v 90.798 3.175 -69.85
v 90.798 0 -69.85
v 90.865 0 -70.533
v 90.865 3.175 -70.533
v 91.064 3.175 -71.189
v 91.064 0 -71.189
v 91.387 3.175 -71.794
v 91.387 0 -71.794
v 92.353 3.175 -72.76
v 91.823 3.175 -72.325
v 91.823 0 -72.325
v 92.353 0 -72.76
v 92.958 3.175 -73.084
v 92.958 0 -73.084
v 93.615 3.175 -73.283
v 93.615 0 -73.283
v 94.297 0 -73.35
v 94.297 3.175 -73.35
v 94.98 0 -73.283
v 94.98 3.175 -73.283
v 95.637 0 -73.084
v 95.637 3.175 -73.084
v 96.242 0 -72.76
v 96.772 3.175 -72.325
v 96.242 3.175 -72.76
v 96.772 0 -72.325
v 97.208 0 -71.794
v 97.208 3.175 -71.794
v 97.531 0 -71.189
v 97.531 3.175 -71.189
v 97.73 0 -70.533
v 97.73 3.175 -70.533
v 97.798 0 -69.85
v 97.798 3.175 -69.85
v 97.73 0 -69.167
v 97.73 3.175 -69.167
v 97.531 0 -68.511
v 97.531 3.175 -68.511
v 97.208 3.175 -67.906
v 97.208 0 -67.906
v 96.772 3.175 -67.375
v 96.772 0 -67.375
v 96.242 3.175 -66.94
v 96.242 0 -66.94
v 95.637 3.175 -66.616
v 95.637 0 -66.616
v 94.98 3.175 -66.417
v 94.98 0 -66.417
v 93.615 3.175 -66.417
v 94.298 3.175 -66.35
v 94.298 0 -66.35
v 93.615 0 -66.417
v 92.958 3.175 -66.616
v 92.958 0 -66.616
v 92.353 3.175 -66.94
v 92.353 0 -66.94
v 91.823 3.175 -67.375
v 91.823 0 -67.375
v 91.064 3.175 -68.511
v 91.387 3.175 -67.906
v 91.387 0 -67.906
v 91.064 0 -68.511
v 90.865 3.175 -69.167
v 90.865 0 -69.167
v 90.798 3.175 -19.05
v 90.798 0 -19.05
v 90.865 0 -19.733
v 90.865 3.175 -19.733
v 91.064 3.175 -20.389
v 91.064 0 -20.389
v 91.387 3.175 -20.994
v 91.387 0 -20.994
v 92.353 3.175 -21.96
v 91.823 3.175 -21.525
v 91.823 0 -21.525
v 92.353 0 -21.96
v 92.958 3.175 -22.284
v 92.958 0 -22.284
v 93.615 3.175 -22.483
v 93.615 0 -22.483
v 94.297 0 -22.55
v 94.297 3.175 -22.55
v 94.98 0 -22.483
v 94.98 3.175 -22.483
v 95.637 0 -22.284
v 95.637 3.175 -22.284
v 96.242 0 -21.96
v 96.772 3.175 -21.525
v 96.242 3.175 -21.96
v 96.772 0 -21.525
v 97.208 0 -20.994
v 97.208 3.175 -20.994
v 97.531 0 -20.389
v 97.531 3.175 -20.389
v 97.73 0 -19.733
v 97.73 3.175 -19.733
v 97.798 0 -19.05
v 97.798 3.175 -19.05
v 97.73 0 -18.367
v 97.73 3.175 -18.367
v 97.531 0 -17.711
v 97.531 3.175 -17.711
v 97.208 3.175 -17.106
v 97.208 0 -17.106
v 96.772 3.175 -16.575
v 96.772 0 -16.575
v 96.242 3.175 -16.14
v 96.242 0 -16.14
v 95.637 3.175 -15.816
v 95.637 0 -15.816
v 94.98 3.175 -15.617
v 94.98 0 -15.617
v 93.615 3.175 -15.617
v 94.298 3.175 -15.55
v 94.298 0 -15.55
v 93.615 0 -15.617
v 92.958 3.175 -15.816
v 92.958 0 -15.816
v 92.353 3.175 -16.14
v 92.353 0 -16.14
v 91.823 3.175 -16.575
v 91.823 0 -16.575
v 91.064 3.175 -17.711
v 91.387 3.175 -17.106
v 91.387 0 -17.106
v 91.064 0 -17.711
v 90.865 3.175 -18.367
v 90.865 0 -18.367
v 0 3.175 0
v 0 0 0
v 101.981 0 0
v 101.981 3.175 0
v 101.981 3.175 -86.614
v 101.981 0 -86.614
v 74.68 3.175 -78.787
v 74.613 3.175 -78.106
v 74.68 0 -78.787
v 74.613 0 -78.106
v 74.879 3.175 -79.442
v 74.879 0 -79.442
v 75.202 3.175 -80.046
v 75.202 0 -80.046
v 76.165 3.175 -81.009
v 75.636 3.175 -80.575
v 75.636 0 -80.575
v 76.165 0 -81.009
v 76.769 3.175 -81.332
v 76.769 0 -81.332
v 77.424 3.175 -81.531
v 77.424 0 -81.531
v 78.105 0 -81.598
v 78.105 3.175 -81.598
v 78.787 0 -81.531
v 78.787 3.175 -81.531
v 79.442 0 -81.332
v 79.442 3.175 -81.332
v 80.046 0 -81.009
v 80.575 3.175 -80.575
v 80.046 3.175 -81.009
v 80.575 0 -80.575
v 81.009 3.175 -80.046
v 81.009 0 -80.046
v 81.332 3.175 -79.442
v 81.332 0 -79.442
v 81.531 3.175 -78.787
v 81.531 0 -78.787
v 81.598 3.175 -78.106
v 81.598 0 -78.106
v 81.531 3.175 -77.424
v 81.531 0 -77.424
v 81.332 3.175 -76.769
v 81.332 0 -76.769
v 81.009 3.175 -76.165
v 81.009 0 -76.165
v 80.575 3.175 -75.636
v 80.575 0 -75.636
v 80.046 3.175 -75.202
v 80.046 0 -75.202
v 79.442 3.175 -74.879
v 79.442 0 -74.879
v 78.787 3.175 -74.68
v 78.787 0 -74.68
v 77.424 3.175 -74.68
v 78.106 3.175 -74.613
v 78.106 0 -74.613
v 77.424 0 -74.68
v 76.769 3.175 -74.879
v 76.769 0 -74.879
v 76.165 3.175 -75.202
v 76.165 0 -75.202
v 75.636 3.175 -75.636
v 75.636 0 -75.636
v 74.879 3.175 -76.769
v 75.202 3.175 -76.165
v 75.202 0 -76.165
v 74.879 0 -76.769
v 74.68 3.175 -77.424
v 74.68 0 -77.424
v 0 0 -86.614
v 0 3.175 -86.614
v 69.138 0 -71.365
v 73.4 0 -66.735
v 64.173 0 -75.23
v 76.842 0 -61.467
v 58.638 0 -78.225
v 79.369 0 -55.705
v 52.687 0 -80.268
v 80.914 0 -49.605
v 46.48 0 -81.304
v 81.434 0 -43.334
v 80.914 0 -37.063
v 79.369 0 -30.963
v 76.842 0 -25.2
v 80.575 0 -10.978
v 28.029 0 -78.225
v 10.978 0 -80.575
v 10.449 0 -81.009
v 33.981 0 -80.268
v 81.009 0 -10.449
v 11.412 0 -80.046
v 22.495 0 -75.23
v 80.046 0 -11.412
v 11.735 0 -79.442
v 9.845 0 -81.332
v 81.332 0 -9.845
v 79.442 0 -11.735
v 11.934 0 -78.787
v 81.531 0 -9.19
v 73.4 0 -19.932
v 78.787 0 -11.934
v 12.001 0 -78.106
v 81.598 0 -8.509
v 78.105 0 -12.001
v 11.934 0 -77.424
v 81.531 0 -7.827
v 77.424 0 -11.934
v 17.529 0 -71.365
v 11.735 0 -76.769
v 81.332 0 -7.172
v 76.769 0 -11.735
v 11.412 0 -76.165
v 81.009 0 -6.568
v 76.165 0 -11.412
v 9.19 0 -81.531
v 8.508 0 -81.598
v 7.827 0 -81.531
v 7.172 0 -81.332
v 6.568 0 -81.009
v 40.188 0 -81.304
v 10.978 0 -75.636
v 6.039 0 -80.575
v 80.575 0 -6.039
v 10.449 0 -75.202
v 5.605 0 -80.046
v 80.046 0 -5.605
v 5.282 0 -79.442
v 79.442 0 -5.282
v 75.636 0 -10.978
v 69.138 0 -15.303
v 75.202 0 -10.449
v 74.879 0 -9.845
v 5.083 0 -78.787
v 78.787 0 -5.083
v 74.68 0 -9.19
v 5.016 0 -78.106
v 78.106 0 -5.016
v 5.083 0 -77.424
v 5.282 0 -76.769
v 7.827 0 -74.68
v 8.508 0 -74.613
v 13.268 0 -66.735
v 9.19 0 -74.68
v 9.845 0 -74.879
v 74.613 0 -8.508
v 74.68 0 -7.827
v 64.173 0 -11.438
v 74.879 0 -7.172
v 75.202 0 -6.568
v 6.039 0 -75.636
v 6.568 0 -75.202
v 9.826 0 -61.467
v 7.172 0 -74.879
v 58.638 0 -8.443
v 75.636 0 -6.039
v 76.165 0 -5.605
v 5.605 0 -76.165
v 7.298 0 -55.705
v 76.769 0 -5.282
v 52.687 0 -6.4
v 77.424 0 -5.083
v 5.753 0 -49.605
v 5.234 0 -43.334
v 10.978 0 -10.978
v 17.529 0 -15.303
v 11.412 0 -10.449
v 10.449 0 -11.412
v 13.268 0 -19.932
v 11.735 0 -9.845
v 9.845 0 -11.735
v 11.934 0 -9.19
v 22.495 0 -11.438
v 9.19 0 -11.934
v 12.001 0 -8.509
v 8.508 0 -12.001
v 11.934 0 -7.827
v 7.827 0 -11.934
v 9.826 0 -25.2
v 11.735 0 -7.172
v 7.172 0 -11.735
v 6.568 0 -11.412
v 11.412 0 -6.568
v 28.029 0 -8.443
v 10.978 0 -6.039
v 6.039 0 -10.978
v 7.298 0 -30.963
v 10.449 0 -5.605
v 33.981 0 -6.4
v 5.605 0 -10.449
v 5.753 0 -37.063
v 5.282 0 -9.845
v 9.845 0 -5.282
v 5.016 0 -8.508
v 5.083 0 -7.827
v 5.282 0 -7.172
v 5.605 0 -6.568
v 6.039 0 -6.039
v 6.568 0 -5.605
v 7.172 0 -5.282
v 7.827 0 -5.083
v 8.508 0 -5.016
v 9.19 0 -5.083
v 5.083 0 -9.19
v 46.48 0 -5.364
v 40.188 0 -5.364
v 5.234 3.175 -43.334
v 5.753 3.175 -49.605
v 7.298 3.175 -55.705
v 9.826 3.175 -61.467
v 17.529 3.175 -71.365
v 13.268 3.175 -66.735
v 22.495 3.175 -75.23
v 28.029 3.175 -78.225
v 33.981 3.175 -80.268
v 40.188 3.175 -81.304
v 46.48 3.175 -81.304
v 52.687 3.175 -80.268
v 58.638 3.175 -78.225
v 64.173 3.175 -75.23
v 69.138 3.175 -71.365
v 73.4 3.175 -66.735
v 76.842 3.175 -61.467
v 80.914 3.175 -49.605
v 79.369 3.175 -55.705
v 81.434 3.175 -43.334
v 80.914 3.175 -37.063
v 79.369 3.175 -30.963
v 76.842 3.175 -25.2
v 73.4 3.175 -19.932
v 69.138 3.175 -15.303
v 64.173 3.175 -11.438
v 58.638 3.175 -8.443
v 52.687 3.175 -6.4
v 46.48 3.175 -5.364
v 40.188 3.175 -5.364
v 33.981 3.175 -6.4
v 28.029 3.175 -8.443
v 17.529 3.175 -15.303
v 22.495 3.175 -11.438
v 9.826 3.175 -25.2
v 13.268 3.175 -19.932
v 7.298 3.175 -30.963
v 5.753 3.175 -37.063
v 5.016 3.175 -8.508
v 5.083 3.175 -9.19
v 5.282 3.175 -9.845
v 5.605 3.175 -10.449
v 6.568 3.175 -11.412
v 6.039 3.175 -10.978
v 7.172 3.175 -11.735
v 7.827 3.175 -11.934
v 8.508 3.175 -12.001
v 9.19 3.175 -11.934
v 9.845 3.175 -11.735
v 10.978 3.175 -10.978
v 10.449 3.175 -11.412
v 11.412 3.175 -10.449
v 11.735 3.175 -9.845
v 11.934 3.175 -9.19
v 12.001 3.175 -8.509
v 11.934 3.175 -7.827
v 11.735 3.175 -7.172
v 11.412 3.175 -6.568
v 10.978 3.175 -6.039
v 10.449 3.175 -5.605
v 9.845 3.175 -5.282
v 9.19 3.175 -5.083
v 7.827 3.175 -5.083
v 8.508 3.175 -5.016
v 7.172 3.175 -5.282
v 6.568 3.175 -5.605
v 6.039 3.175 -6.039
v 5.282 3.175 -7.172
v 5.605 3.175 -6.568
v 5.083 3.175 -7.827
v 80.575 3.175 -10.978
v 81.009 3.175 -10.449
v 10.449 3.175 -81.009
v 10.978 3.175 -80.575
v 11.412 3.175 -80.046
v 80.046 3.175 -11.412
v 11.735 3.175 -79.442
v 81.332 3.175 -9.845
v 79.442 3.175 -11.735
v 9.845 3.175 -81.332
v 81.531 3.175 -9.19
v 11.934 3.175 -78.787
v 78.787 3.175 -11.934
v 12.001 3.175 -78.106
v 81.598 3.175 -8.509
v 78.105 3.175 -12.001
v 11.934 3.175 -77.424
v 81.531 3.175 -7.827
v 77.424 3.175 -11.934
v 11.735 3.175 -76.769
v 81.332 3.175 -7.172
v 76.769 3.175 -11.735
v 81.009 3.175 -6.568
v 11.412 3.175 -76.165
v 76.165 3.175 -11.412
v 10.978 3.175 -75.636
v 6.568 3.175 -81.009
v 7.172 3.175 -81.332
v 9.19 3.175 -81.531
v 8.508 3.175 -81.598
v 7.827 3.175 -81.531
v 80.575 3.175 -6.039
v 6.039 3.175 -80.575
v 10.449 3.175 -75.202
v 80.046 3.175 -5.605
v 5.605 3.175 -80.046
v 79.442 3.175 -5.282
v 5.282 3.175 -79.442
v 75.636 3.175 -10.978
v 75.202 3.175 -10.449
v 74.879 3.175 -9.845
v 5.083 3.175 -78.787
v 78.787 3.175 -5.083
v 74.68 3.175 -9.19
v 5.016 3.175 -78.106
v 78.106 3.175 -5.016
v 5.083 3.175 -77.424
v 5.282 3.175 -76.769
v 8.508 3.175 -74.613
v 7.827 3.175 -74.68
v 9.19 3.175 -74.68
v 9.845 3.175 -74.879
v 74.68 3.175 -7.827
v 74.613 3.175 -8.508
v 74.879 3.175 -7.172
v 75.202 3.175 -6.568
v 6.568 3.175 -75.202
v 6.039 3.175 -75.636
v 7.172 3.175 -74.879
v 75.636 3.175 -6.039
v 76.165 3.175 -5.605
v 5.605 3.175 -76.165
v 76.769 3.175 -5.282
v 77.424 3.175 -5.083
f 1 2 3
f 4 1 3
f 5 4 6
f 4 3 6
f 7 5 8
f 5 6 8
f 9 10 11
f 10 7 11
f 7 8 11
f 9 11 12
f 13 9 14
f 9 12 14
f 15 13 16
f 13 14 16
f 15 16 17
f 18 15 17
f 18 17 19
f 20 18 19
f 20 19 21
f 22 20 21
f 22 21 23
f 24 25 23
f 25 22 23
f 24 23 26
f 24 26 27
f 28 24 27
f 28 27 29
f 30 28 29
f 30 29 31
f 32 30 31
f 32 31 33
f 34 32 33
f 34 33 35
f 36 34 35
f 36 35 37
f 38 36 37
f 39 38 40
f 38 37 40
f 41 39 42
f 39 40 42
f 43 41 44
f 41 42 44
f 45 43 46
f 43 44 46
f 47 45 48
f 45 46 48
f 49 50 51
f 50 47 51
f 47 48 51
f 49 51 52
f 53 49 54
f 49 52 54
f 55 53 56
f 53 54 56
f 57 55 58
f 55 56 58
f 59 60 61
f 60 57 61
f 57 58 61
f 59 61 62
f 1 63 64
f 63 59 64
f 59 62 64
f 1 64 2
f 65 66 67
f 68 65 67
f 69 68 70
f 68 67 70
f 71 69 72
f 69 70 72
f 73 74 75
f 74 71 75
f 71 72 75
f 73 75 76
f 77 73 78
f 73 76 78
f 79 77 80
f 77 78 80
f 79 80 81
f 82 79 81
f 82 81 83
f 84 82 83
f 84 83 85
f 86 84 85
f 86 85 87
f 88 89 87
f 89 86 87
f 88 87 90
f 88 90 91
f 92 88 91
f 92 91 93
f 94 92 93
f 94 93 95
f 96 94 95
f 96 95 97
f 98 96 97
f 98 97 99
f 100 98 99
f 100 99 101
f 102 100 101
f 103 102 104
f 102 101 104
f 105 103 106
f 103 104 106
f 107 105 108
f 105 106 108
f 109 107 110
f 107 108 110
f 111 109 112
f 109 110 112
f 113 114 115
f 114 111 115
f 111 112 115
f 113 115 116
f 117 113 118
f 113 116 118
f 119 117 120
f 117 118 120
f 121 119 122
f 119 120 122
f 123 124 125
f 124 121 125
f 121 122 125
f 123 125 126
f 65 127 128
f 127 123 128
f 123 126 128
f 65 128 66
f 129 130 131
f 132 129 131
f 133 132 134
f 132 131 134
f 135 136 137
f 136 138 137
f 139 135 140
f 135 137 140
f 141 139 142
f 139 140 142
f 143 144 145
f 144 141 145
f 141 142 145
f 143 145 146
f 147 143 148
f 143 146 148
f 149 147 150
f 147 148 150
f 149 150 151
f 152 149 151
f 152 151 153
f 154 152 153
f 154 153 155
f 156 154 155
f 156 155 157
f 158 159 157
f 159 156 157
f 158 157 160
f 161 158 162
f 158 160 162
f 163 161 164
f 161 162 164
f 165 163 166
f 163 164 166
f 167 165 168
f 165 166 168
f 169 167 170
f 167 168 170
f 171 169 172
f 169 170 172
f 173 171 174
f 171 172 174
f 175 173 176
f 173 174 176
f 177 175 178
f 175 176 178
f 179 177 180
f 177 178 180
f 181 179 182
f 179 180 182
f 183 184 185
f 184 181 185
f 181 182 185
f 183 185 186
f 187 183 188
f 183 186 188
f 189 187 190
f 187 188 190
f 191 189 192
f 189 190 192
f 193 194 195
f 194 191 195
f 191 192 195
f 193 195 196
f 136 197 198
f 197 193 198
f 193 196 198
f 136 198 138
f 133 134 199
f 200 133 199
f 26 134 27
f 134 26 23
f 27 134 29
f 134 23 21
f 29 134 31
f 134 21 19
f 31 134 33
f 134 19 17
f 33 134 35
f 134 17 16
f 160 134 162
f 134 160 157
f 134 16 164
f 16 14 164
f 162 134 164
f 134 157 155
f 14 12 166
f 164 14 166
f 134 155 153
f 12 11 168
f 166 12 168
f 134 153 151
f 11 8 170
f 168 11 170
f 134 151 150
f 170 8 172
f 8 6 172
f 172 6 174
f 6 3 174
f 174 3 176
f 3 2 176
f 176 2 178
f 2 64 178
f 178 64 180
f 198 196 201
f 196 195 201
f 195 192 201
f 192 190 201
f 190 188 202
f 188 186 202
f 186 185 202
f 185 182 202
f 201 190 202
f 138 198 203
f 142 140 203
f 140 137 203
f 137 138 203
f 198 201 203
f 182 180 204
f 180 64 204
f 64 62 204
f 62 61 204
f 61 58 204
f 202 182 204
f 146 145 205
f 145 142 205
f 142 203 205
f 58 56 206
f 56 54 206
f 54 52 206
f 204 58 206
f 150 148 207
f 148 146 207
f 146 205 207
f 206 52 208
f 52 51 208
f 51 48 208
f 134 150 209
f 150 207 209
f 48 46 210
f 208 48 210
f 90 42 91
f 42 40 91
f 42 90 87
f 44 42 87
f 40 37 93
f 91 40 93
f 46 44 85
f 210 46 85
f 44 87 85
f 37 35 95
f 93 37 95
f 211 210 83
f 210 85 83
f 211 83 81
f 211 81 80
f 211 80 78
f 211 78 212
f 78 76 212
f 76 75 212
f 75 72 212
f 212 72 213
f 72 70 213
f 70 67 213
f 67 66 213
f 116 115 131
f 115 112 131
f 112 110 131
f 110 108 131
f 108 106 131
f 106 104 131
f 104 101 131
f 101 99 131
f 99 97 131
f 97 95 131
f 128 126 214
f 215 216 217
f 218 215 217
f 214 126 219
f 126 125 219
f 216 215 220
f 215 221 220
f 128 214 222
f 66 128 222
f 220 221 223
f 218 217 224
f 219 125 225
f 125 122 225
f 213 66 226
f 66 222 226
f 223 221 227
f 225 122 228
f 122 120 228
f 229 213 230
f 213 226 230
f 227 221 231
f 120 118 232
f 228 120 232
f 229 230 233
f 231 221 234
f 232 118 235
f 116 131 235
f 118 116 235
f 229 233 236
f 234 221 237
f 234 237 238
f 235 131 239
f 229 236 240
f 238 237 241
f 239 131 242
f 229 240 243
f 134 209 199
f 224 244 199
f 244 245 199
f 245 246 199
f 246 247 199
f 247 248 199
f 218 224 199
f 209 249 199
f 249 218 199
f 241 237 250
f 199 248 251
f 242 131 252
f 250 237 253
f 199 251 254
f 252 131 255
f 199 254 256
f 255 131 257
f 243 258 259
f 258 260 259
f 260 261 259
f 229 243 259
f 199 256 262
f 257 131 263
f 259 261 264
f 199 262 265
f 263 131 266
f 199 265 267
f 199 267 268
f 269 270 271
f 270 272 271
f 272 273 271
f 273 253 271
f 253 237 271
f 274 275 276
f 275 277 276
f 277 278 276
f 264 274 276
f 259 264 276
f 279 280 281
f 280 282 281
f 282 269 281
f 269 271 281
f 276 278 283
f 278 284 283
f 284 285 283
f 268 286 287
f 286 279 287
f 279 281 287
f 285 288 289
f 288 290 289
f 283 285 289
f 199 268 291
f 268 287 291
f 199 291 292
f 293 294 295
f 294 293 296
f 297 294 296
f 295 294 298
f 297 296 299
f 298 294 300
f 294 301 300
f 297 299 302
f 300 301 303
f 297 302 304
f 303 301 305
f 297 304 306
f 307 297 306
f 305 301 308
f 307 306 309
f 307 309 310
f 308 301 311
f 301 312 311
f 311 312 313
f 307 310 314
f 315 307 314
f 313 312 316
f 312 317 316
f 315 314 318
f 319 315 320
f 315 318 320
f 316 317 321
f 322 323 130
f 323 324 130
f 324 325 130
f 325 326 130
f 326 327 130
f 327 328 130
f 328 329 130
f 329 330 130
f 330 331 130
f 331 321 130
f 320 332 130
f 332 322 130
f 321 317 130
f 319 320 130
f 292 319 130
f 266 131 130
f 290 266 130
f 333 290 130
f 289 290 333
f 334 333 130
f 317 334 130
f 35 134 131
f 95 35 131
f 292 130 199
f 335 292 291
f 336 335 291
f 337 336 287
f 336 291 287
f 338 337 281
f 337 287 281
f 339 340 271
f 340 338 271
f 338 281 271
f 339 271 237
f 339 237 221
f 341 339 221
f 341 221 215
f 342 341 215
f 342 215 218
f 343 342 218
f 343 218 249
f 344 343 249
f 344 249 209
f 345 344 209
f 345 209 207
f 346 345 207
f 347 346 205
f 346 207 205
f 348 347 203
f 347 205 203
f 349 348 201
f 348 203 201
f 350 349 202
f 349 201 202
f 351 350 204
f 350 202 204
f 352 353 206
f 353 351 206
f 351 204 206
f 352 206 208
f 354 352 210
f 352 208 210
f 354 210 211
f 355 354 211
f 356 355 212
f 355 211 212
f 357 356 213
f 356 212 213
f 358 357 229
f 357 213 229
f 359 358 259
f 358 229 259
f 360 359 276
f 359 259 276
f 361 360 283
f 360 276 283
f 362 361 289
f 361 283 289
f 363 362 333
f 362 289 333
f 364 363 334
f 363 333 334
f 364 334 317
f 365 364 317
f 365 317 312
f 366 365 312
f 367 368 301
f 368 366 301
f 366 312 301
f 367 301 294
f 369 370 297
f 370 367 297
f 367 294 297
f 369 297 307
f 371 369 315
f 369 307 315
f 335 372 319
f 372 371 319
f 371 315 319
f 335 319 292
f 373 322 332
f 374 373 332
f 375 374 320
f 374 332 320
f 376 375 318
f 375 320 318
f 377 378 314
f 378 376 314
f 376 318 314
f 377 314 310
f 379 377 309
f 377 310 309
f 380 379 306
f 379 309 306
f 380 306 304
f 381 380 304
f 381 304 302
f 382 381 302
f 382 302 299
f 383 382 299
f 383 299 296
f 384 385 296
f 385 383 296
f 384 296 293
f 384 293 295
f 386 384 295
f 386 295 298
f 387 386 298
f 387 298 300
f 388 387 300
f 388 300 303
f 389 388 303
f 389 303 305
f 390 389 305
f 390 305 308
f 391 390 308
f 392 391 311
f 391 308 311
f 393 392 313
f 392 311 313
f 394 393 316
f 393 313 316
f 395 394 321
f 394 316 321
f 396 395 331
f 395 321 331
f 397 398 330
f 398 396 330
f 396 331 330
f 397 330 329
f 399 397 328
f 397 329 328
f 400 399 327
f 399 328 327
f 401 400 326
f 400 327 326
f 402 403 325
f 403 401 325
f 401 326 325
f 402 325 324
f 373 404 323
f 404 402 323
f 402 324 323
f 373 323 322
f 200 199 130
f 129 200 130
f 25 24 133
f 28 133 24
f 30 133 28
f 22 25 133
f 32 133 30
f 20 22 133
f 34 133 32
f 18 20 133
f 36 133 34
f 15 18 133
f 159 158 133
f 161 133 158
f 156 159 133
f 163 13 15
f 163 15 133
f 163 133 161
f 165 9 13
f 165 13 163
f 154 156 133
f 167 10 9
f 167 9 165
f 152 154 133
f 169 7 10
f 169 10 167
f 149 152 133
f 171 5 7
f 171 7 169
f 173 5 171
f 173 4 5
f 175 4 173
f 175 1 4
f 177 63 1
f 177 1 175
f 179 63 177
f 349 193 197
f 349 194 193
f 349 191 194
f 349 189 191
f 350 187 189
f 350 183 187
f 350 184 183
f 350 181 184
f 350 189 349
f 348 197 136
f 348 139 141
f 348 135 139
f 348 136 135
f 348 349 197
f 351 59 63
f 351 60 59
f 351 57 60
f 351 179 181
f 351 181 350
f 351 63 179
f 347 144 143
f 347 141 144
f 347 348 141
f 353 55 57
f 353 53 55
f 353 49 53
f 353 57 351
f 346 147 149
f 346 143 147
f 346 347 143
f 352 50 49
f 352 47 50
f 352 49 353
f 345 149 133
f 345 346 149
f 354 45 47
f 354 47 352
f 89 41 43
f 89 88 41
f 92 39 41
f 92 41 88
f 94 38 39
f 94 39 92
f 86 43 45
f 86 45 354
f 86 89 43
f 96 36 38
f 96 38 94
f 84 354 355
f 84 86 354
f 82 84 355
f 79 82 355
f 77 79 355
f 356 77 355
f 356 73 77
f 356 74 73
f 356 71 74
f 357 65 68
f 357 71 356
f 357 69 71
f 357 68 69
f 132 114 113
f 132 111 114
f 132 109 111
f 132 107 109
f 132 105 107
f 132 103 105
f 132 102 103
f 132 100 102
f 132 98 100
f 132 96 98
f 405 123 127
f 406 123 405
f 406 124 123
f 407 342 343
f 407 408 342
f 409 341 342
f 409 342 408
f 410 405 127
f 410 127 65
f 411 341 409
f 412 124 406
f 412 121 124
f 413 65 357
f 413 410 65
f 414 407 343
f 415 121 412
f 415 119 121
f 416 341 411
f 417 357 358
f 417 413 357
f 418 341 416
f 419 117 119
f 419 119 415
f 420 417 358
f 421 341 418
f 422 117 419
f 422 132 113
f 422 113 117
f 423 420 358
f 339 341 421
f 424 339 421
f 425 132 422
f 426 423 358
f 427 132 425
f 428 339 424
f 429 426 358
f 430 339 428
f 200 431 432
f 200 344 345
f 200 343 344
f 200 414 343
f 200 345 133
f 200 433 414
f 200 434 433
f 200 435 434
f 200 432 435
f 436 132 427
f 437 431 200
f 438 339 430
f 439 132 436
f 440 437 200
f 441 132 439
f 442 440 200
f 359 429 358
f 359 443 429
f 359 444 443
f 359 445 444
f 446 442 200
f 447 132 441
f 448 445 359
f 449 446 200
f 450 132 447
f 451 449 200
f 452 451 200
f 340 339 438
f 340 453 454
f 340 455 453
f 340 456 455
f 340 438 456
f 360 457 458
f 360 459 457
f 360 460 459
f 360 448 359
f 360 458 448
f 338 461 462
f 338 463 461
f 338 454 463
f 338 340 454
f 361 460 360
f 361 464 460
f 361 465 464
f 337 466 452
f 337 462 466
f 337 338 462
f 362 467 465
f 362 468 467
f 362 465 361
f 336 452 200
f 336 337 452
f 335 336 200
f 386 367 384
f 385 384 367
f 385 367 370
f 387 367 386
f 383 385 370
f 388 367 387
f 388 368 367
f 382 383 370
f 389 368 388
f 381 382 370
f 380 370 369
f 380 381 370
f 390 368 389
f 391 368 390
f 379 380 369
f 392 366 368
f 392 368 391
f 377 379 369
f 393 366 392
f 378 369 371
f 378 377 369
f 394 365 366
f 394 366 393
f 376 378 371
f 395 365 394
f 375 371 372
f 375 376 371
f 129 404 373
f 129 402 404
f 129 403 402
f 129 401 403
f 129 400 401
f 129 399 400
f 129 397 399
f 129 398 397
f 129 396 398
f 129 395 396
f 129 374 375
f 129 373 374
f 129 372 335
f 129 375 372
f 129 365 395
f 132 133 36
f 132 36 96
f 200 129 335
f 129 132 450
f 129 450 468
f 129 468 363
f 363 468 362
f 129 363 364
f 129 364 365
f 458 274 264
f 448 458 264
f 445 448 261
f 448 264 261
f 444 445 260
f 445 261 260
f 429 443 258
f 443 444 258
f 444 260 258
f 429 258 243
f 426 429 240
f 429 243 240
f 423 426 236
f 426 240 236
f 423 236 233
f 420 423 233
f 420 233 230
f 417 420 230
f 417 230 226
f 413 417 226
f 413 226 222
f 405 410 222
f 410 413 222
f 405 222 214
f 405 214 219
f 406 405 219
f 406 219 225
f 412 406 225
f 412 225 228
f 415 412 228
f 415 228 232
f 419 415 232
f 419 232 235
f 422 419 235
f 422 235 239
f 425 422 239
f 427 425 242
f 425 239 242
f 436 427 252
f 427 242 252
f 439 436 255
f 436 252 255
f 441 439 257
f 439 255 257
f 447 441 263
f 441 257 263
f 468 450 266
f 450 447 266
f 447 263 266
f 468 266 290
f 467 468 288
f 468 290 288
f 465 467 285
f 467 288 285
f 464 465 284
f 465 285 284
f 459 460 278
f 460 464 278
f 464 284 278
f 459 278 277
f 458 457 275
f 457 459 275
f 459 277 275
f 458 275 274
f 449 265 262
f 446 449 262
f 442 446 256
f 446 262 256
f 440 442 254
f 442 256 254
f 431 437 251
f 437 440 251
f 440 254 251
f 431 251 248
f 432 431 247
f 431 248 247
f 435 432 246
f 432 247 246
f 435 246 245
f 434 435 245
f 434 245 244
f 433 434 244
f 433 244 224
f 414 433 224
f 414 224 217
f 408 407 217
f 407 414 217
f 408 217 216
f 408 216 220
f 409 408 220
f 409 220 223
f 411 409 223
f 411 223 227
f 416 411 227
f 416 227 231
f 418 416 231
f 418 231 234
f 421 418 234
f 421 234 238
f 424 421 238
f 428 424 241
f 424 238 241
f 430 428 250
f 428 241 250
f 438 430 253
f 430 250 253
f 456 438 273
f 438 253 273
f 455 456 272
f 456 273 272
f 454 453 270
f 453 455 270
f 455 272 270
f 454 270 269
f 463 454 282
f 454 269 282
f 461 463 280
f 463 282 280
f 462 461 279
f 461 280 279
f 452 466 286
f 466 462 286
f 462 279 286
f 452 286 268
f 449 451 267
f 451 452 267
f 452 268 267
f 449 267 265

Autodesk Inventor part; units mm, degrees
ref_plane "YZ Plane" through (0, 0, 0) normal (1, 0, 0) x (0, 1, 0)
ref_plane "XZ Plane" through (0, 0, 0) normal (0, 1, 0) x (-1, 0, 0)
ref_plane "XY Plane" through (0, 0, 0) normal (0, 0, 1) x (1, 0, 0)
sketch "Sketch1" plane through (0, 0, 0) normal (0, 1, 0) x (-1, 0, 0)
  line L0 (0, 0) -> (-101.981, 0)
  line L1 (-101.981, 0) -> (-101.981, -86.614)
  line L2 (-101.981, -86.614) -> (0, -86.614)
  line L3 (0, -86.614) -> (0, 0)
  circle A0 centre (-8.5085, -8.5085) radius 3.4925
  circle A1 centre (-78.1055, -8.5085) radius 3.4925
  circle A2 centre (-8.5085, -78.1055) radius 3.4925
  circle A3 centre (-78.1055, -78.1055) radius 3.4925
  circle A4 centre (-43.3338, -43.3338) radius 38.1
  circle A5 centre (-94.2975, -19.05) radius 3.5
  circle A6 centre (-94.2975, -69.85) radius 3.5
  dimension "d0" = 101.981
  dimension "d1" = 86.614
  dimension "d2" = 6.985
  dimension "d3" = 8.5085
  dimension "d4" = 8.5085
  dimension "d7" = 69.597
  dimension "d10" = 69.597
  dimension "d13" = 76.2
  dimension "d14" = 43.3338
  dimension "d15" = 43.3338
  dimension "d16" = 7
  dimension "d19" = 50.8
  dimension "d24" = 19.05
  dimension "d27" = 7.6835
extrude "Extrusion1" add sketch "Sketch1" along normal blind 3.175
properties part number "MotorPlate"
